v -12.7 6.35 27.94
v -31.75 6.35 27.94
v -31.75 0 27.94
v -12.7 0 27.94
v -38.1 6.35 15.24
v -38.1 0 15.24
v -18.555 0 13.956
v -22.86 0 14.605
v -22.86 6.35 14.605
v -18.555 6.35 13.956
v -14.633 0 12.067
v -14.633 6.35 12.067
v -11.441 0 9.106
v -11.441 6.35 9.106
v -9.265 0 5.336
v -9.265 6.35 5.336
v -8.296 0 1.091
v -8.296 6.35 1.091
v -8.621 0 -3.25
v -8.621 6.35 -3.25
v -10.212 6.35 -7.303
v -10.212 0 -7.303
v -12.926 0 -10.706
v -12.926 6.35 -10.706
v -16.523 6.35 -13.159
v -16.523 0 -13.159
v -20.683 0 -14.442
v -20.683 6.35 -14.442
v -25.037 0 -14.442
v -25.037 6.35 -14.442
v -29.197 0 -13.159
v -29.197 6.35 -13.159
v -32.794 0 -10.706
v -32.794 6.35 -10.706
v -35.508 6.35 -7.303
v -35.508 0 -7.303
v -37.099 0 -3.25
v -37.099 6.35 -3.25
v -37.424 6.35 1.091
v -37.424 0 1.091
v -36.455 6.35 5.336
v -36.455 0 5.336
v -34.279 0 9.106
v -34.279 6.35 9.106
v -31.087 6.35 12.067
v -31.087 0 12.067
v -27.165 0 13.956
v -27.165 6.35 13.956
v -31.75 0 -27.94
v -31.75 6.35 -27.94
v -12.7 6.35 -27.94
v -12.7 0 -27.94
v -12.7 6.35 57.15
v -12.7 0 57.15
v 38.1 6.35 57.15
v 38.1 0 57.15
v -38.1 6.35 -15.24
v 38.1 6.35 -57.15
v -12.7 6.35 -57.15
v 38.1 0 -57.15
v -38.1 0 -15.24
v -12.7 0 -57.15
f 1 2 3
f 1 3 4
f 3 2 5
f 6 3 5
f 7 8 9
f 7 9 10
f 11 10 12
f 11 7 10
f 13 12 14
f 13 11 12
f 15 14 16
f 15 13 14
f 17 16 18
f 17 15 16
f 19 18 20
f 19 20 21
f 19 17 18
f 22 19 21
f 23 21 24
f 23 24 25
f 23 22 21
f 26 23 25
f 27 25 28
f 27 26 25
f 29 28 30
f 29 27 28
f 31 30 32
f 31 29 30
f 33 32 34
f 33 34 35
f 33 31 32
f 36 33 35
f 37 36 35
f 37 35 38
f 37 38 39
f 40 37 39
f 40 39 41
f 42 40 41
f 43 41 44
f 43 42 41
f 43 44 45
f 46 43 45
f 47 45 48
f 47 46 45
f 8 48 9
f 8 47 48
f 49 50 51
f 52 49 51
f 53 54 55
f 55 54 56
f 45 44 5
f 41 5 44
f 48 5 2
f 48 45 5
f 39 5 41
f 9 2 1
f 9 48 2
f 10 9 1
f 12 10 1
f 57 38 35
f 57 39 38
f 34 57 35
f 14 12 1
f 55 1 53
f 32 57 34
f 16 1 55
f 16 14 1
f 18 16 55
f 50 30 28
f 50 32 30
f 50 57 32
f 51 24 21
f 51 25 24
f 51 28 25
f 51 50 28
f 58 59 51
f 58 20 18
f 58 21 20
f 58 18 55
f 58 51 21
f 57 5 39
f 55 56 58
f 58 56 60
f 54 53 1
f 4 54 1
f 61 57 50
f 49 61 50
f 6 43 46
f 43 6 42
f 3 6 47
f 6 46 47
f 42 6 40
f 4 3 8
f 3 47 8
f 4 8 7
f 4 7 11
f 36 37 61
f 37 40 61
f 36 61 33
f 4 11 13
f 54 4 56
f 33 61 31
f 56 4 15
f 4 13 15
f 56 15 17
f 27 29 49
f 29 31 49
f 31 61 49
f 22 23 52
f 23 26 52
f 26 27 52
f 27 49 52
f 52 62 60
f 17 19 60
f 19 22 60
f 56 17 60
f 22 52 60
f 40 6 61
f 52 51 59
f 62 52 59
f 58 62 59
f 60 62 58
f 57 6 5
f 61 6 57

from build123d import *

# Parameters (mm, degrees)
SKETCH1_W           = 76.2
SKETCH1_H           = 114.3
SKETCH1_R           = 14.605
BOSS_EXTRUDE1_DEPTH = 6.35
CUT_EXTRUDE1_REACH  = 70.979
SKETCH2_W           = 25.4
SKETCH2_H           = 29.21
CUT_EXTRUDE3_REACH  = 70.979


with BuildPart() as part:
    # Sketch1 → Boss-Extrude1 (new body)
    with BuildSketch(Plane(origin=(0, 0, 0), x_dir=(1, 0, 0), z_dir=(0, 1, 0))):
        Rectangle(SKETCH1_W, SKETCH1_H)
        with Locations(Location((-22.86, 0, 0), (0, 0, 270))):
            Circle(SKETCH1_R, mode=Mode.SUBTRACT)
    extrude(amount=BOSS_EXTRUDE1_DEPTH)

    # Sketch2 → Cut-Extrude1 (cut, up to next)
    with BuildSketch(Plane(origin=(0, 6.35, 0), x_dir=(1, 0, 0), z_dir=(0, 1, 0)), mode=Mode.PRIVATE) as cut_extrude1_sk1:
        with Locations((-25.4, 42.545)):
            Rectangle(SKETCH2_W, SKETCH2_H)
    cut_extrude1_tool1 = extrude(cut_extrude1_sk1.sketch, amount=-CUT_EXTRUDE1_REACH, mode=Mode.PRIVATE) & part.part
    # Sketch2 → Cut-Extrude1 (cut, up to next)
    with BuildSketch(Plane(origin=(0, 6.35, 0), x_dir=(1, 0, 0), z_dir=(0, 1, 0)), mode=Mode.PRIVATE) as cut_extrude1_sk2:
        with Locations((-25.4, -42.545)):
            Rectangle(SKETCH2_W, SKETCH2_H)
    cut_extrude1_tool2 = extrude(cut_extrude1_sk2.sketch, amount=-CUT_EXTRUDE1_REACH, mode=Mode.PRIVATE) & part.part
    add(cut_extrude1_tool1.solids().sort_by_distance((-25.4, 6.35, -42.545))[0], mode=Mode.SUBTRACT)
    add(cut_extrude1_tool2.solids().sort_by_distance((-25.4, 6.35, 42.545))[0], mode=Mode.SUBTRACT)

    # Sketch4 → Cut-Extrude3 (cut, up to next)
    with BuildSketch(Plane(origin=(0, 6.35, 0), x_dir=(1, 0, 0), z_dir=(0, 1, 0)), mode=Mode.PRIVATE) as cut_extrude3_sk1:
        Polygon((-31.75, -27.94), (-38.1, -15.24), (-38.1, -27.94), align=None)
    cut_extrude3_tool1 = extrude(cut_extrude3_sk1.sketch, amount=-CUT_EXTRUDE3_REACH, mode=Mode.PRIVATE) & part.part
    # Sketch4 → Cut-Extrude3 (cut, up to next)
    with BuildSketch(Plane(origin=(0, 6.35, 0), x_dir=(1, 0, 0), z_dir=(0, 1, 0)), mode=Mode.PRIVATE) as cut_extrude3_sk2:
        Polygon((-31.75, 27.94), (-38.1, 27.94), (-38.1, 15.24), align=None)
    cut_extrude3_tool2 = extrude(cut_extrude3_sk2.sketch, amount=-CUT_EXTRUDE3_REACH, mode=Mode.PRIVATE) & part.part
    add(cut_extrude3_tool1.solids().sort_by_distance((-35.983333, 6.35, 23.706667))[0], mode=Mode.SUBTRACT)
    add(cut_extrude3_tool2.solids().sort_by_distance((-35.983333, 6.35, -23.706667))[0], mode=Mode.SUBTRACT)


solid = part.part
